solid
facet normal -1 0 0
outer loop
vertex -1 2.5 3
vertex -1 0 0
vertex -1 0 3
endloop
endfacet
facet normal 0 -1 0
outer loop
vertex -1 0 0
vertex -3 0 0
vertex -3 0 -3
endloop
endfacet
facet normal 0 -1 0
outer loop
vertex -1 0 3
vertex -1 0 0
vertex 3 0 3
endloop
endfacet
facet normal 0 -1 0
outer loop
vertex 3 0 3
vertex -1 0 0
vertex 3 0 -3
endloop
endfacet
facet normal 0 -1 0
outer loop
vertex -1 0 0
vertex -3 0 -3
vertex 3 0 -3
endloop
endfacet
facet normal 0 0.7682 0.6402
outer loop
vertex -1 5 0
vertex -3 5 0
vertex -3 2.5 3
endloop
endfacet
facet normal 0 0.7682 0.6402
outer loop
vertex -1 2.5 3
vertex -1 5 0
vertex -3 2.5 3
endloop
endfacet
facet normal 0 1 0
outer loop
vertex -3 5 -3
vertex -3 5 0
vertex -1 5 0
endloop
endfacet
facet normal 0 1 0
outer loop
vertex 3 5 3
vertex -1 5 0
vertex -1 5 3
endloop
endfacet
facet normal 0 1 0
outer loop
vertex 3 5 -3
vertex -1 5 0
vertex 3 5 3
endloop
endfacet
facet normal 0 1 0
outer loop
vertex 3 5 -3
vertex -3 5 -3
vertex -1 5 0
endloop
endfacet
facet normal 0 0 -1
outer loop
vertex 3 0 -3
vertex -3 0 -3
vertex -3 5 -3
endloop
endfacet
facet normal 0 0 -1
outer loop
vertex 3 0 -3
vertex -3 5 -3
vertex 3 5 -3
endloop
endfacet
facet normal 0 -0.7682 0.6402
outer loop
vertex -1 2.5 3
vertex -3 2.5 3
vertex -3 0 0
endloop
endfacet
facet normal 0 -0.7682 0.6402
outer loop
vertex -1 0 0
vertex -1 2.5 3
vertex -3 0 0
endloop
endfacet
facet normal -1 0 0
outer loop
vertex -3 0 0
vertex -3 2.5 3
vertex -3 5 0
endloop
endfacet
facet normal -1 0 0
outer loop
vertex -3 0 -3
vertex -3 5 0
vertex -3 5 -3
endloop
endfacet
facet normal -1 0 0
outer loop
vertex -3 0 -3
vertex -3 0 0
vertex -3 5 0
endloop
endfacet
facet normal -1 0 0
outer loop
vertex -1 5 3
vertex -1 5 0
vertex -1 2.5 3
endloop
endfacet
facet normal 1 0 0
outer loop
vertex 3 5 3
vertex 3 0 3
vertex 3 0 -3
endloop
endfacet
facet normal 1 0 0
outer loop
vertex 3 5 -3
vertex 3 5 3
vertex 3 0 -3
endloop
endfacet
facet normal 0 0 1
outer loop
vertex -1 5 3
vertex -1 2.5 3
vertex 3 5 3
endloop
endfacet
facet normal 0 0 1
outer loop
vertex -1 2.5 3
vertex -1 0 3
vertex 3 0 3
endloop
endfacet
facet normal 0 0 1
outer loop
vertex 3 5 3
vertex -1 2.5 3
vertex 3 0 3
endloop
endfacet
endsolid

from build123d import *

# Parameters (mm, degrees)
SKETCH1_W           = 6
SKETCH1_H           = 6
BOSS_EXTRUDE1_DEPTH = 5
CUT_EXTRUDE1_DEPTH  = 2


with BuildPart() as part:
    # Sketch1 → Boss-Extrude1 (new body)
    with BuildSketch(Plane(origin=(0, 0, 0), x_dir=(1, 0, 0), z_dir=(0, 1, 0))):
        Rectangle(SKETCH1_W, SKETCH1_H)
    extrude(amount=BOSS_EXTRUDE1_DEPTH)

    # Sketch2 → Cut-Extrude1 (cut)
    with BuildSketch(Plane.ZY.offset(3)):
        Polygon((3, 5), (0, 5), (3, 2.5), align=None)
        Polygon((3, 0), (3, 2.5), (0, 0), align=None)
    extrude(amount=-CUT_EXTRUDE1_DEPTH, mode=Mode.SUBTRACT)


solid = part.part
